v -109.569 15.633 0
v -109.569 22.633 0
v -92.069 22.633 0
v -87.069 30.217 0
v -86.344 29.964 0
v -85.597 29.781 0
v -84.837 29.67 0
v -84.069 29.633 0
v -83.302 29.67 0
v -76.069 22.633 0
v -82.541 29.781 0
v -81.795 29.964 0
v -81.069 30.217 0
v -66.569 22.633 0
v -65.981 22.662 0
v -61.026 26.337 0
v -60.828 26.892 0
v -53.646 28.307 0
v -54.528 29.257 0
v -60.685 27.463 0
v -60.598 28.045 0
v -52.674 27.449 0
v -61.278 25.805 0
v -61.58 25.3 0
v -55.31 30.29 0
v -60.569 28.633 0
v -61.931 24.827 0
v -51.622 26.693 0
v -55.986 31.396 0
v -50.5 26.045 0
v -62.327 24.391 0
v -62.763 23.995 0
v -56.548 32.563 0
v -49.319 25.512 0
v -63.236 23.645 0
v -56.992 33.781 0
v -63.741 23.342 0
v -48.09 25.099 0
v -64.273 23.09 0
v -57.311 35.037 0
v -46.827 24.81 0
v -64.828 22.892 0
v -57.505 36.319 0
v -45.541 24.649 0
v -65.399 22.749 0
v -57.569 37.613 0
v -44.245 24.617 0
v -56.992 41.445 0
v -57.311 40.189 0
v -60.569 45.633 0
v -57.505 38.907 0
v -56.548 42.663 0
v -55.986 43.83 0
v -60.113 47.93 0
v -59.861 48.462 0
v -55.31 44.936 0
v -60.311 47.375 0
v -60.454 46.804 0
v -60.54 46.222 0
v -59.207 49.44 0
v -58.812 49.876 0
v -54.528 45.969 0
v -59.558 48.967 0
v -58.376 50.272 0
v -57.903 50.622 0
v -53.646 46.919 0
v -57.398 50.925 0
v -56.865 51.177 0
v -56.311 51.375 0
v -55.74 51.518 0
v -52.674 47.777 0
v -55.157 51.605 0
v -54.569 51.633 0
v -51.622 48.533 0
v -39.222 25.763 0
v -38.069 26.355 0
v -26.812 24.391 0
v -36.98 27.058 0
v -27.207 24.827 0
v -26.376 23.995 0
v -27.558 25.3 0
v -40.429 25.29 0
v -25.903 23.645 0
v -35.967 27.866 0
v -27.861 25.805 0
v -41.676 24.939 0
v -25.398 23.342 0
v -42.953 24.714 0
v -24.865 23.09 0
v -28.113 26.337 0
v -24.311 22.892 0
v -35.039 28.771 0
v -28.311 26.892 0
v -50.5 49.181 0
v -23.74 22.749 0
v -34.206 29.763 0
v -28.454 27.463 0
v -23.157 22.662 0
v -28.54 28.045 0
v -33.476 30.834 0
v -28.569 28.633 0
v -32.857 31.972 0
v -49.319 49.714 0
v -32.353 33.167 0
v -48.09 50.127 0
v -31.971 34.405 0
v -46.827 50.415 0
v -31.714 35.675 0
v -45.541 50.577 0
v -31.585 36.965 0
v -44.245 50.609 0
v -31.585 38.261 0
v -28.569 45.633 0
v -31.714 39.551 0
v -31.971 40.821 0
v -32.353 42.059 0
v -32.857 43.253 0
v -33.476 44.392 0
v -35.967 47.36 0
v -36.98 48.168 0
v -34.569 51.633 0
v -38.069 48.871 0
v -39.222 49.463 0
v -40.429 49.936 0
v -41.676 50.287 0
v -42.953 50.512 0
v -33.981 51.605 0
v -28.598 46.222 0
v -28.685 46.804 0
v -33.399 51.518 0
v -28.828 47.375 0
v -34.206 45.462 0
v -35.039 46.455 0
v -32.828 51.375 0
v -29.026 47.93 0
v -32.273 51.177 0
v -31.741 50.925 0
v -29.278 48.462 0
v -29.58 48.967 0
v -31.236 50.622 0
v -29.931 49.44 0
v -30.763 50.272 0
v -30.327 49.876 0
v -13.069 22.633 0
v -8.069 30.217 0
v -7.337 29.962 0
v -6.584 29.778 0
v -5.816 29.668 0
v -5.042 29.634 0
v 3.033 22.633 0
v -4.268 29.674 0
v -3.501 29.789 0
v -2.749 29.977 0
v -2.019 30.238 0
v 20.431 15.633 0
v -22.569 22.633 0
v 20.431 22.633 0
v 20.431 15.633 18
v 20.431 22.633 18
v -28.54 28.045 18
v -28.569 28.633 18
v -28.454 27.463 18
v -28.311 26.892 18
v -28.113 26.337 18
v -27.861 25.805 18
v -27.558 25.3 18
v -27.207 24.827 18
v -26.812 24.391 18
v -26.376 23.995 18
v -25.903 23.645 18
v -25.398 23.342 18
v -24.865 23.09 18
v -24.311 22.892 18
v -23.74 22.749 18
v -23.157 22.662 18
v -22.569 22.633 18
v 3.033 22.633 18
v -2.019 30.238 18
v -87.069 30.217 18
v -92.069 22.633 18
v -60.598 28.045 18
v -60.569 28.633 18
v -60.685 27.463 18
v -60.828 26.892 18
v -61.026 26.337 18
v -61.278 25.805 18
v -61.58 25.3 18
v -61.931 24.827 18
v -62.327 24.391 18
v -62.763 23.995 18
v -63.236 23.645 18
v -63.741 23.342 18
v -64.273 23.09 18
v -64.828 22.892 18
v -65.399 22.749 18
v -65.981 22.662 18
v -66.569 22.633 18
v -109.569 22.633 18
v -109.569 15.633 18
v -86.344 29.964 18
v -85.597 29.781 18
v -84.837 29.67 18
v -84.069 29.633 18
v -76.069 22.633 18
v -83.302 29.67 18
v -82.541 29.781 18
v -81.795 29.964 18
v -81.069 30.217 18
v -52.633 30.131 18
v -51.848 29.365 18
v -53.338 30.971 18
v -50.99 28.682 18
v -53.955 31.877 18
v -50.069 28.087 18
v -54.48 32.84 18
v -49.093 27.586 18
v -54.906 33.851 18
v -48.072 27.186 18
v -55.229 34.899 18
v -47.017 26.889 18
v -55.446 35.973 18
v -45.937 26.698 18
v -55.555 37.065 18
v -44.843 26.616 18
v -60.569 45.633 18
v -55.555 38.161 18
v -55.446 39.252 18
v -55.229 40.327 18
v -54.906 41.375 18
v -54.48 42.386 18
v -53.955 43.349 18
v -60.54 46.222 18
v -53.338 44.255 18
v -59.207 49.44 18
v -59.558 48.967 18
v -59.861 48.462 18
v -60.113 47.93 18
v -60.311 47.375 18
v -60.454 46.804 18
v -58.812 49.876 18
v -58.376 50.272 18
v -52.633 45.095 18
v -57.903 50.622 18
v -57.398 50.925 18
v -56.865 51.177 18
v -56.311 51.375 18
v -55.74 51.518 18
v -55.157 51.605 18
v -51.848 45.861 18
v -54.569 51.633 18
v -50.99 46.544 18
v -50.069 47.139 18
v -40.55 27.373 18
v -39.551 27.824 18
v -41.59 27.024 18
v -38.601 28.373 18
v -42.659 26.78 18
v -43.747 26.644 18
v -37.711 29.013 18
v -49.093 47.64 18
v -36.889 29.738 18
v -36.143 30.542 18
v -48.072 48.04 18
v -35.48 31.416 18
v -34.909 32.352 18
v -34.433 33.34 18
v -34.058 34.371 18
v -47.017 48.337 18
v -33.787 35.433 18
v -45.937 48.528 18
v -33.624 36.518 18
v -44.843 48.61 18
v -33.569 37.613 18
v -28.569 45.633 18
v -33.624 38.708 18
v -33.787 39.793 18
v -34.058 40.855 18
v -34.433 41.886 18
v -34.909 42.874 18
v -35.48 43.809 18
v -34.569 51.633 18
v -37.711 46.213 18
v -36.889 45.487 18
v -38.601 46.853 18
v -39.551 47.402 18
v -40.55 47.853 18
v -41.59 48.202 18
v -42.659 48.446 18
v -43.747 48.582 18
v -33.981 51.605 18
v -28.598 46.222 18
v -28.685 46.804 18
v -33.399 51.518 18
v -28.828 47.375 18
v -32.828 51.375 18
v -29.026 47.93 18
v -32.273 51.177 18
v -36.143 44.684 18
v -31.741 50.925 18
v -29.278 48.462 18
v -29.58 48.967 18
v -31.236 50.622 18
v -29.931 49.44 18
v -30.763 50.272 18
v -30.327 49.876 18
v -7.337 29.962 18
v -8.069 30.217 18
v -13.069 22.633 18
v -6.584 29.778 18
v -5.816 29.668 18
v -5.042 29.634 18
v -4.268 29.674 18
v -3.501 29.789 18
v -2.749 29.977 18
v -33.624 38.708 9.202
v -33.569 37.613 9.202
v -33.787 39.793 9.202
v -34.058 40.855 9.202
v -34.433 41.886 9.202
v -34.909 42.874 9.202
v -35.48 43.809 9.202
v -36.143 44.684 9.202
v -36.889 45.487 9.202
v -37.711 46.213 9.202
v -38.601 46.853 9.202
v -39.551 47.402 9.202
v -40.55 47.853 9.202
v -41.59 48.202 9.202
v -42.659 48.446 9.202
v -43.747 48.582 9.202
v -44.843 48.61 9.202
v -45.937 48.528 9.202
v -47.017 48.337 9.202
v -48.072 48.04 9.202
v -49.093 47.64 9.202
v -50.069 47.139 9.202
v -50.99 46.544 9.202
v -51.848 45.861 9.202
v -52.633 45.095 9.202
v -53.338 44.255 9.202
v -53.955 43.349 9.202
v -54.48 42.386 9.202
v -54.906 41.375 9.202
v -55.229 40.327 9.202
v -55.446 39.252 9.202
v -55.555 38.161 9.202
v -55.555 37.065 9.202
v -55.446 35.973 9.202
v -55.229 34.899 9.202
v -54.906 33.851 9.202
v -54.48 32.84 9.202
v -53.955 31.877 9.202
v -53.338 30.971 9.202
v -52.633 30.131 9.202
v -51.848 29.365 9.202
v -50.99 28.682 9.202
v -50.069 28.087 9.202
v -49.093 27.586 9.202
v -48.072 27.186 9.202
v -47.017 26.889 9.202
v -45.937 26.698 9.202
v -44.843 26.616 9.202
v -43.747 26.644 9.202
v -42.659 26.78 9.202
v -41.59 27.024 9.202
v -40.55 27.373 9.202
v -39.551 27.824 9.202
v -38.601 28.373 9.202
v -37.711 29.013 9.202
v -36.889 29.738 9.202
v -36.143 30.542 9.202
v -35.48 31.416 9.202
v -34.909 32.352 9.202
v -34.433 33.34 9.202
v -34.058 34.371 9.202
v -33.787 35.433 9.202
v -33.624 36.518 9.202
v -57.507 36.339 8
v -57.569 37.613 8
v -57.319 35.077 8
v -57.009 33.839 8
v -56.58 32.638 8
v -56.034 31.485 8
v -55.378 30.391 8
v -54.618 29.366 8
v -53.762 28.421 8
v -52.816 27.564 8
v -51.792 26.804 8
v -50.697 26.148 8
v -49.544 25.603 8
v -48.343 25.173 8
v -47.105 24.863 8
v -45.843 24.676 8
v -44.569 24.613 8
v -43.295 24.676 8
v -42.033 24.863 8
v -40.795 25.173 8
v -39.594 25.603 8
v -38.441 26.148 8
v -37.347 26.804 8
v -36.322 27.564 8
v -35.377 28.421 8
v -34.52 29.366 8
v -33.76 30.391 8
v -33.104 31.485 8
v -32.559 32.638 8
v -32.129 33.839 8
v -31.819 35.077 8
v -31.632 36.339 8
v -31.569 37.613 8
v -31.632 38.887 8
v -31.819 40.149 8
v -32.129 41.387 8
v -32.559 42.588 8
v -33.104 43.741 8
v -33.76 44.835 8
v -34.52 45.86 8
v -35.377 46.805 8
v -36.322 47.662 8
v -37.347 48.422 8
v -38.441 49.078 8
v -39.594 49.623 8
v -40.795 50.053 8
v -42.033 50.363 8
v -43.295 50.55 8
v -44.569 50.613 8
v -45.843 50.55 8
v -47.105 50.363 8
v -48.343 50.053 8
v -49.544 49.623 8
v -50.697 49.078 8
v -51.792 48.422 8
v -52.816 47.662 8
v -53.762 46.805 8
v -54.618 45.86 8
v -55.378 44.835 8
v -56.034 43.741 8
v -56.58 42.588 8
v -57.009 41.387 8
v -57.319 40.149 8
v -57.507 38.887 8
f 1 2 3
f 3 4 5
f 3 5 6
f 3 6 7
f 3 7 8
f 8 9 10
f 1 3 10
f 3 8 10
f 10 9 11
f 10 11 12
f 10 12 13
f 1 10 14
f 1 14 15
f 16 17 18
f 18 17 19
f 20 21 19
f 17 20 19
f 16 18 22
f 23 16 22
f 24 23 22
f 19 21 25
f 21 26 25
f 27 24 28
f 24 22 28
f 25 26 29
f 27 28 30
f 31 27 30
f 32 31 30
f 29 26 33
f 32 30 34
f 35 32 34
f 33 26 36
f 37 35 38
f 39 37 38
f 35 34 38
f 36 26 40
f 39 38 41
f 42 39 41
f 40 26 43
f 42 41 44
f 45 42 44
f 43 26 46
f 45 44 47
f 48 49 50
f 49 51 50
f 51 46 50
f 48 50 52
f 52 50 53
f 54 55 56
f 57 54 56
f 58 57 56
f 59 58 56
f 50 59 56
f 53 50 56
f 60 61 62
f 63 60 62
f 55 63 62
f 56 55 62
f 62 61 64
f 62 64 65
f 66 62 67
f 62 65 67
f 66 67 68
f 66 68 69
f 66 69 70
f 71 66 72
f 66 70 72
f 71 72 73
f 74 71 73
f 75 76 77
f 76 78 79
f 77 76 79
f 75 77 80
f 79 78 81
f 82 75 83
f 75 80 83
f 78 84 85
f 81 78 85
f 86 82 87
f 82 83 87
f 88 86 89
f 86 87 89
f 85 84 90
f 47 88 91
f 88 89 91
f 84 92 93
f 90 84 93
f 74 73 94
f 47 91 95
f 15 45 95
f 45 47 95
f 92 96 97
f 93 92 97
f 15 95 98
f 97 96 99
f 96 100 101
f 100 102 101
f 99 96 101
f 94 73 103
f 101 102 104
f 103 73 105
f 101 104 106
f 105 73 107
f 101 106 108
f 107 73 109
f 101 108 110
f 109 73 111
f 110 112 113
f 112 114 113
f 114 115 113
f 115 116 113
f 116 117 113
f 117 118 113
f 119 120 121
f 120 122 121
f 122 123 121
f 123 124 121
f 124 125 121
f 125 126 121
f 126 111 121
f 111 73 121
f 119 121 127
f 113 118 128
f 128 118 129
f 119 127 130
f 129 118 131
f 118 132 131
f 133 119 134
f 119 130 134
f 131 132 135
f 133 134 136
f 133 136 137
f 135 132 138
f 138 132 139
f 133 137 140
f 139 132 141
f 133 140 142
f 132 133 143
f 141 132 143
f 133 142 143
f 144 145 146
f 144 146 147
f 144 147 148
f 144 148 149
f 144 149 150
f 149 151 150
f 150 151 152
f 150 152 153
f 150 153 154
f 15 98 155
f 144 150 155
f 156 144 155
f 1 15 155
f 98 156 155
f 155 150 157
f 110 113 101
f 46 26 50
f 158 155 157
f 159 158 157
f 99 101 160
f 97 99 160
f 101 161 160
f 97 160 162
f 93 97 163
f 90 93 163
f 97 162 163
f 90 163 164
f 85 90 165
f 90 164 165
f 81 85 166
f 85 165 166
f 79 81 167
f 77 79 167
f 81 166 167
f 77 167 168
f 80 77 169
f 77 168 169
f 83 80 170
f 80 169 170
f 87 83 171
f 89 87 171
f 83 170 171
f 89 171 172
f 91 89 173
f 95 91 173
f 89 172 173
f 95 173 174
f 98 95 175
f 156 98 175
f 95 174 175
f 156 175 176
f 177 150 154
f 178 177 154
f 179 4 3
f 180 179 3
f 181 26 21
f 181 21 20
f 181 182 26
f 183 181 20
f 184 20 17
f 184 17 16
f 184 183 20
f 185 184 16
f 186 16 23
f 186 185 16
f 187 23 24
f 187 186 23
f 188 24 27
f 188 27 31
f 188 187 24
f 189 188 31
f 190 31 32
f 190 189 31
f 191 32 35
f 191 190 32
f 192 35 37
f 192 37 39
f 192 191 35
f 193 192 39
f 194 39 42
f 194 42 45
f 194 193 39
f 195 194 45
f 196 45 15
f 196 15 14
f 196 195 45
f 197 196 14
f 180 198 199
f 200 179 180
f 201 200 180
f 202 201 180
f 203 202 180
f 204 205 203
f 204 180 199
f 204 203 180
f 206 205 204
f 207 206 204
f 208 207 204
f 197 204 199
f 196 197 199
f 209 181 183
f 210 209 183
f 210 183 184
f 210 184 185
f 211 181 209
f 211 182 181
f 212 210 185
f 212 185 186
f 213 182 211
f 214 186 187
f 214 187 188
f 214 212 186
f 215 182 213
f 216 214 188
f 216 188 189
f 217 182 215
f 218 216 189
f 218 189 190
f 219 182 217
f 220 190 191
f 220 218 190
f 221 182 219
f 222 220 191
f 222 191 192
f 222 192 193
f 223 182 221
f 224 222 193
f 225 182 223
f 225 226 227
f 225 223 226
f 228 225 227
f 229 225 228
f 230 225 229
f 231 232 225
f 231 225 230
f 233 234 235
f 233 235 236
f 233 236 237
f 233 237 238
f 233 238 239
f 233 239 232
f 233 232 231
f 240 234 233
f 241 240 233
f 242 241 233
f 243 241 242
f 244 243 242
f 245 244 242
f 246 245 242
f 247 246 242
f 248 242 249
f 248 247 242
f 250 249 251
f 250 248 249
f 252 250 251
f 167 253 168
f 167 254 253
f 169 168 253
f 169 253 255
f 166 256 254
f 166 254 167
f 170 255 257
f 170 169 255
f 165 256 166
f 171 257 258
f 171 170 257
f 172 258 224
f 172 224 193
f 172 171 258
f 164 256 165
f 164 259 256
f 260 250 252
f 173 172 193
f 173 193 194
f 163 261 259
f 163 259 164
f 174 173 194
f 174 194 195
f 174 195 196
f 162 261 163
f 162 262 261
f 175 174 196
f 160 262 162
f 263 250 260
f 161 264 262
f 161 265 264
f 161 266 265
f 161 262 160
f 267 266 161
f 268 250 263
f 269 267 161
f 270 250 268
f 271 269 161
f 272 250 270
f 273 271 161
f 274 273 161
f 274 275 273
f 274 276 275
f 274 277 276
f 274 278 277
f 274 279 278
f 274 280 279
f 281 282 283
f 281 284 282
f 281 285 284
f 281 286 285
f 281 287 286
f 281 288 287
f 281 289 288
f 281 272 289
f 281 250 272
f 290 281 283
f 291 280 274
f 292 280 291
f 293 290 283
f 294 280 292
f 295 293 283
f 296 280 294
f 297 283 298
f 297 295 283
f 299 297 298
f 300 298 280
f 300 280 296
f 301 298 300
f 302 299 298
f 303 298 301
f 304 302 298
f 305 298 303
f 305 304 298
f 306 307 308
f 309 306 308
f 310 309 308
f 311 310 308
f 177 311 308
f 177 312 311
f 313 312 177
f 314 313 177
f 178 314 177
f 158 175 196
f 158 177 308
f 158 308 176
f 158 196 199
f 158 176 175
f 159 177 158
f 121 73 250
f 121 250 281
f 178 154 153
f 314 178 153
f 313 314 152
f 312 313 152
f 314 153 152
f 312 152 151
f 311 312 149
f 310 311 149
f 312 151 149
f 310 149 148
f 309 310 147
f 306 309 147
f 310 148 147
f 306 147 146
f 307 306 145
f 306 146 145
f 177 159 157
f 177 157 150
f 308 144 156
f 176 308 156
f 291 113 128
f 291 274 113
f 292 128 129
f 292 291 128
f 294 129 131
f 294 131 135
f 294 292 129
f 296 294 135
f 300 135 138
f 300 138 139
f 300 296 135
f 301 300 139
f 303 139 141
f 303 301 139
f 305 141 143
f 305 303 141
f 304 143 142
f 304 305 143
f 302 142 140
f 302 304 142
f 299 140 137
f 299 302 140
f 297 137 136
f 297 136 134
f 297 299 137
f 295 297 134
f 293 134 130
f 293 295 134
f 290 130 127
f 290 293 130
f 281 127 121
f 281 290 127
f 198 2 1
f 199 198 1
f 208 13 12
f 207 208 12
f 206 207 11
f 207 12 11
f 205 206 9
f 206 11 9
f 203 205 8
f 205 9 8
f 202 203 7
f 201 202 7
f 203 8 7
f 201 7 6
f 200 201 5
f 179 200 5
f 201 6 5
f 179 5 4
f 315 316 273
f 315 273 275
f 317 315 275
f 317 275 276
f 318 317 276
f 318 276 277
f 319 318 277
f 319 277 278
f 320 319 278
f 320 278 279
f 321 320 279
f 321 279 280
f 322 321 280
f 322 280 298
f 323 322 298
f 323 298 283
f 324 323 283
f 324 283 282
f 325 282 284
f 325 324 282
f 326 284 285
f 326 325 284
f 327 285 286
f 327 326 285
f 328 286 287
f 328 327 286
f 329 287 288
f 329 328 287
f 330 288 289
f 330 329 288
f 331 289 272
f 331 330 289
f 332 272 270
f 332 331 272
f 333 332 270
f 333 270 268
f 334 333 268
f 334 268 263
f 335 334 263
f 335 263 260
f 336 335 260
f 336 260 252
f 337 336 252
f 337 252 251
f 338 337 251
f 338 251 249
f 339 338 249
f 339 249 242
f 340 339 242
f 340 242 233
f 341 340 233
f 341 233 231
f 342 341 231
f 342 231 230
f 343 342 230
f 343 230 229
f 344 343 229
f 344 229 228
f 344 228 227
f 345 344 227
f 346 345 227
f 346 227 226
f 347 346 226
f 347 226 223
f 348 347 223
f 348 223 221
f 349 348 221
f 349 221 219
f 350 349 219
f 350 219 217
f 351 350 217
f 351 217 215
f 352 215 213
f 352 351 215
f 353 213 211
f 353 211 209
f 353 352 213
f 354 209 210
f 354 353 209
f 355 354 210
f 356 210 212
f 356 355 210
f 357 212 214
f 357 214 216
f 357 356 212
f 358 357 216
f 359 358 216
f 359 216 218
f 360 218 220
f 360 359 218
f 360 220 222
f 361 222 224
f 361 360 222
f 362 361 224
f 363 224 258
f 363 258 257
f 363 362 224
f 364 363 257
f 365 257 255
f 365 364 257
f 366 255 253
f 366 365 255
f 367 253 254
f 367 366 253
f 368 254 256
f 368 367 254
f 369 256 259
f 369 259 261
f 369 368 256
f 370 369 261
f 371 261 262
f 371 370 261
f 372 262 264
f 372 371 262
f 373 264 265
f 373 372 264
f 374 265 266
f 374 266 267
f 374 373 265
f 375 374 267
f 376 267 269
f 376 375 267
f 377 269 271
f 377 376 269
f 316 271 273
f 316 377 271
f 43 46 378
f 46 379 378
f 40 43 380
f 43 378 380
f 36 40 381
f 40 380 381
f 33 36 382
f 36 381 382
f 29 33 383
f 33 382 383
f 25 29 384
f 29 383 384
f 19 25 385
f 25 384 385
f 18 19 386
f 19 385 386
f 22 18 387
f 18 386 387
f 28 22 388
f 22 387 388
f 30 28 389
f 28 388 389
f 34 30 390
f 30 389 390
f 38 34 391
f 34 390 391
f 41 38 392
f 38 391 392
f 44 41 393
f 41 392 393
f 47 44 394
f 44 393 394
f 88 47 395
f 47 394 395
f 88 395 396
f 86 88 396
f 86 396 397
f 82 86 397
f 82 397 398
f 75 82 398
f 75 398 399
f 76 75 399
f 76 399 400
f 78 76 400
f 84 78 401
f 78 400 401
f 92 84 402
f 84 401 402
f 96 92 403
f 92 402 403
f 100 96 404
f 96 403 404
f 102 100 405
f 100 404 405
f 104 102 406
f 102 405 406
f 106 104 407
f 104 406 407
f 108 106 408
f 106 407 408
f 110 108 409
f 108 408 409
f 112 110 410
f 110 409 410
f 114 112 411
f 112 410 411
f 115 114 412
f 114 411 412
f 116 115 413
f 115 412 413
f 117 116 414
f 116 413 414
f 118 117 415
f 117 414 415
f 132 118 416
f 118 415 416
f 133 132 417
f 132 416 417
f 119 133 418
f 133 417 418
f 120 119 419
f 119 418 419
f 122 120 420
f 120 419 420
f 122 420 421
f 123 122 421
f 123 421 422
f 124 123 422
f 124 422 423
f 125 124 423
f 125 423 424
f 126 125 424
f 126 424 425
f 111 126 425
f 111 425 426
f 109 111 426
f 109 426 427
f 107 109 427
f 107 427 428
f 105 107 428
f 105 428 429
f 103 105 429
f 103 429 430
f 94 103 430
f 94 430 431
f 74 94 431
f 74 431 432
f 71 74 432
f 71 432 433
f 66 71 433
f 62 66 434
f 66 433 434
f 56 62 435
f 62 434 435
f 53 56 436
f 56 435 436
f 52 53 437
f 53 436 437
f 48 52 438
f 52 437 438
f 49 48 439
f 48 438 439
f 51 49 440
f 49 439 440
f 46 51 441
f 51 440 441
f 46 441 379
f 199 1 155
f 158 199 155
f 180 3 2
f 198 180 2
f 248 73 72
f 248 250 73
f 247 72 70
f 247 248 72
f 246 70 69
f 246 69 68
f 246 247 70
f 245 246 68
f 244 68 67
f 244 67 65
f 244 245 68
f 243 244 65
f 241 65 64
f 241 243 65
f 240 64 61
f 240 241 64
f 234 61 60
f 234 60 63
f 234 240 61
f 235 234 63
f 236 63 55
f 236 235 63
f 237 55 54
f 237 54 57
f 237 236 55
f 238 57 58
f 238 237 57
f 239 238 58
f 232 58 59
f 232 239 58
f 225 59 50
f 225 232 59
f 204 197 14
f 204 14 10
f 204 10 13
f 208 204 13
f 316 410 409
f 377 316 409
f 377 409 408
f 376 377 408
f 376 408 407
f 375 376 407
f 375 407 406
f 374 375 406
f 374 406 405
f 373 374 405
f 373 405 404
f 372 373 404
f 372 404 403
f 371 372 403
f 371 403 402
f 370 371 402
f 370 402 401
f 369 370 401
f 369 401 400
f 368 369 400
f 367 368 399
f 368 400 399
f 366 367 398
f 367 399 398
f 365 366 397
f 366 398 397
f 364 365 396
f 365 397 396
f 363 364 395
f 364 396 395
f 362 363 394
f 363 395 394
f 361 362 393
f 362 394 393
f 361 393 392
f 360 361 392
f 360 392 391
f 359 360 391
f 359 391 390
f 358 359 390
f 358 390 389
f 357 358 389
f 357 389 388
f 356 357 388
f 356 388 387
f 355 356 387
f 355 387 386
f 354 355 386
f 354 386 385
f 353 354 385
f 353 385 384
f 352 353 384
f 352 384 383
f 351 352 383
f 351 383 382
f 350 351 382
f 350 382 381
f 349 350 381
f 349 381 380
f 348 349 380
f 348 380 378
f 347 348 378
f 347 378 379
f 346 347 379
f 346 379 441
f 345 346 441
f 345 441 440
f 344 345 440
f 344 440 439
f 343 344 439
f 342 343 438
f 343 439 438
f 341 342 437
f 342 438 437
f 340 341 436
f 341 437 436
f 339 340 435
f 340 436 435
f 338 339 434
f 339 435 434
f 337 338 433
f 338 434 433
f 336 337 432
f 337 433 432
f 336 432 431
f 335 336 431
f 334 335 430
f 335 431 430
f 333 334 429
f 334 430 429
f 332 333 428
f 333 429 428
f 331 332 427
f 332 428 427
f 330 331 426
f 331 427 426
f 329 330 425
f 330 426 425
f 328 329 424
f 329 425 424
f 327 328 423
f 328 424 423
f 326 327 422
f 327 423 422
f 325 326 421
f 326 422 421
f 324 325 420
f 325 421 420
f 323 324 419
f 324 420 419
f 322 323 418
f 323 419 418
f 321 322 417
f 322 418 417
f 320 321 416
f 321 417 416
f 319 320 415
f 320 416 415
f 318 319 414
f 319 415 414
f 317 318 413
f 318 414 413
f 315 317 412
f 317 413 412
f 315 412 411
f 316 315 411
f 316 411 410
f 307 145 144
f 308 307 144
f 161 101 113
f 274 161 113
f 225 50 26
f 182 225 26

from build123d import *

# Parameters (mm, degrees)
F0_W     = 32
F0_H     = 7
F0_H_2   = 29
F0_R     = 13
F0_R_2   = 11
F1_DEPTH = 18
F2_D     = 26
F2_DEPTH = 8
F2_TIP   = 7.8111880474
F3_R     = 6


with BuildPart() as f1:
    # F0 (on Top) → F1 (new body)
    with BuildSketch(Plane.XY):
        with Locations((-44.5692668381, 19.1334804479)):
            Rectangle(F0_W, F0_H)
        with Locations((-44.5692668381, 37.1334804479)):
            Rectangle(F0_W, F0_H_2)
        with Locations((-44.5691263461, 37.6129510462)):
            Circle(F0_R, mode=Mode.SUBTRACT)
        Polygon((-92.0692668381, 22.6334804479), (-109.5692668381, 22.6334804479), (-109.5692668381, 15.6334804479), (-60.5692668381, 15.6334804479), (-60.5692668381, 22.6334804479), (-76.0692668381, 22.6334804479), (-81.0692668381, 22.6334804479), (-87.0692668381, 22.6334804479), align=None)
        Polygon((-13.0689858541, 22.6334804479), (-28.5692668381, 22.6334804479), (-28.5692668381, 15.6334804479), (20.4307331619, 15.6334804479), (20.4307331619, 22.6334804479), (3.0333849776, 22.6334804479), (-1.9666150224, 22.6334804479), (-8.0689858541, 22.6334804479), align=None)
        with Locations((-44.5691263461, 37.6129510462)):
            Circle(F0_R)
        with Locations((-44.5691263461, 37.6129510462)):
            Circle(F0_R_2, mode=Mode.SUBTRACT)
        Polygon((-81.0692668381, 22.6334804479), (-76.0692668381, 22.6334804479), (-81.0692668381, 30.2172819608), align=None)
        with BuildLine():
            Line((-87.0692668381, 30.2172819608), (-87.0692668381, 22.6334804479))
            Line((-87.0692668381, 22.6334804479), (-81.0692668381, 22.6334804479))
            Line((-81.0692668381, 22.6334804479), (-81.0692668381, 30.2172819608))
            ThreePointArc((-81.0692668381, 30.2172819608), (-84.0692668381, 29.6334804479), (-87.0692668381, 30.2172819608))
        make_face()
        Polygon((-87.0692668381, 30.2172819608), (-92.0692668381, 22.6334804479), (-87.0692668381, 22.6334804479), align=None)
        Polygon((-8.0689858541, 30.2171683033), (-13.0689858541, 22.6334804479), (-8.0689858541, 22.6334804479), align=None)
        with BuildLine():
            Line((-8.0689858541, 30.2171683033), (-8.0689858541, 22.6334804479))
            Line((-8.0689858541, 22.6334804479), (-1.9666150224, 22.6334804479))
            Line((-1.9666150224, 22.6334804479), (-2.018655908, 30.2379566021))
            ThreePointArc((-2.018655908, 30.2379566021), (-5.0417798399, 29.633527669), (-8.0689858541, 30.2171683033))
        make_face()
        Polygon((-1.9666150224, 22.6334804479), (3.0333849776, 22.6334804479), (-2.018655908, 30.2379566021), align=None)
    extrude(amount=F1_DEPTH)

    # F2
    with Locations(Plane(origin=(0, 0, 0), x_dir=(1, 0, 0), z_dir=(0, 0, -1))):
        with Locations((-44.5691263461, -37.6129510462)):
            Hole(F2_D / 2, depth=F2_DEPTH)
            with Locations((0, 0, -(F2_DEPTH + F2_TIP / 2))):  # 118° drill point
                Cone(0, F2_D / 2, F2_TIP, mode=Mode.SUBTRACT)

    # F3
    f3_edges = [f1.edges().sort_by_distance(p)[0] for p in [
        (-60.569267, 22.63348, 9),
        (-28.569267, 22.63348, 9),
        (-60.569267, 51.63348, 9),
        (-28.569267, 51.63348, 9),
    ]]
    fillet(f3_edges, radius=F3_R)


solid = f1.part
